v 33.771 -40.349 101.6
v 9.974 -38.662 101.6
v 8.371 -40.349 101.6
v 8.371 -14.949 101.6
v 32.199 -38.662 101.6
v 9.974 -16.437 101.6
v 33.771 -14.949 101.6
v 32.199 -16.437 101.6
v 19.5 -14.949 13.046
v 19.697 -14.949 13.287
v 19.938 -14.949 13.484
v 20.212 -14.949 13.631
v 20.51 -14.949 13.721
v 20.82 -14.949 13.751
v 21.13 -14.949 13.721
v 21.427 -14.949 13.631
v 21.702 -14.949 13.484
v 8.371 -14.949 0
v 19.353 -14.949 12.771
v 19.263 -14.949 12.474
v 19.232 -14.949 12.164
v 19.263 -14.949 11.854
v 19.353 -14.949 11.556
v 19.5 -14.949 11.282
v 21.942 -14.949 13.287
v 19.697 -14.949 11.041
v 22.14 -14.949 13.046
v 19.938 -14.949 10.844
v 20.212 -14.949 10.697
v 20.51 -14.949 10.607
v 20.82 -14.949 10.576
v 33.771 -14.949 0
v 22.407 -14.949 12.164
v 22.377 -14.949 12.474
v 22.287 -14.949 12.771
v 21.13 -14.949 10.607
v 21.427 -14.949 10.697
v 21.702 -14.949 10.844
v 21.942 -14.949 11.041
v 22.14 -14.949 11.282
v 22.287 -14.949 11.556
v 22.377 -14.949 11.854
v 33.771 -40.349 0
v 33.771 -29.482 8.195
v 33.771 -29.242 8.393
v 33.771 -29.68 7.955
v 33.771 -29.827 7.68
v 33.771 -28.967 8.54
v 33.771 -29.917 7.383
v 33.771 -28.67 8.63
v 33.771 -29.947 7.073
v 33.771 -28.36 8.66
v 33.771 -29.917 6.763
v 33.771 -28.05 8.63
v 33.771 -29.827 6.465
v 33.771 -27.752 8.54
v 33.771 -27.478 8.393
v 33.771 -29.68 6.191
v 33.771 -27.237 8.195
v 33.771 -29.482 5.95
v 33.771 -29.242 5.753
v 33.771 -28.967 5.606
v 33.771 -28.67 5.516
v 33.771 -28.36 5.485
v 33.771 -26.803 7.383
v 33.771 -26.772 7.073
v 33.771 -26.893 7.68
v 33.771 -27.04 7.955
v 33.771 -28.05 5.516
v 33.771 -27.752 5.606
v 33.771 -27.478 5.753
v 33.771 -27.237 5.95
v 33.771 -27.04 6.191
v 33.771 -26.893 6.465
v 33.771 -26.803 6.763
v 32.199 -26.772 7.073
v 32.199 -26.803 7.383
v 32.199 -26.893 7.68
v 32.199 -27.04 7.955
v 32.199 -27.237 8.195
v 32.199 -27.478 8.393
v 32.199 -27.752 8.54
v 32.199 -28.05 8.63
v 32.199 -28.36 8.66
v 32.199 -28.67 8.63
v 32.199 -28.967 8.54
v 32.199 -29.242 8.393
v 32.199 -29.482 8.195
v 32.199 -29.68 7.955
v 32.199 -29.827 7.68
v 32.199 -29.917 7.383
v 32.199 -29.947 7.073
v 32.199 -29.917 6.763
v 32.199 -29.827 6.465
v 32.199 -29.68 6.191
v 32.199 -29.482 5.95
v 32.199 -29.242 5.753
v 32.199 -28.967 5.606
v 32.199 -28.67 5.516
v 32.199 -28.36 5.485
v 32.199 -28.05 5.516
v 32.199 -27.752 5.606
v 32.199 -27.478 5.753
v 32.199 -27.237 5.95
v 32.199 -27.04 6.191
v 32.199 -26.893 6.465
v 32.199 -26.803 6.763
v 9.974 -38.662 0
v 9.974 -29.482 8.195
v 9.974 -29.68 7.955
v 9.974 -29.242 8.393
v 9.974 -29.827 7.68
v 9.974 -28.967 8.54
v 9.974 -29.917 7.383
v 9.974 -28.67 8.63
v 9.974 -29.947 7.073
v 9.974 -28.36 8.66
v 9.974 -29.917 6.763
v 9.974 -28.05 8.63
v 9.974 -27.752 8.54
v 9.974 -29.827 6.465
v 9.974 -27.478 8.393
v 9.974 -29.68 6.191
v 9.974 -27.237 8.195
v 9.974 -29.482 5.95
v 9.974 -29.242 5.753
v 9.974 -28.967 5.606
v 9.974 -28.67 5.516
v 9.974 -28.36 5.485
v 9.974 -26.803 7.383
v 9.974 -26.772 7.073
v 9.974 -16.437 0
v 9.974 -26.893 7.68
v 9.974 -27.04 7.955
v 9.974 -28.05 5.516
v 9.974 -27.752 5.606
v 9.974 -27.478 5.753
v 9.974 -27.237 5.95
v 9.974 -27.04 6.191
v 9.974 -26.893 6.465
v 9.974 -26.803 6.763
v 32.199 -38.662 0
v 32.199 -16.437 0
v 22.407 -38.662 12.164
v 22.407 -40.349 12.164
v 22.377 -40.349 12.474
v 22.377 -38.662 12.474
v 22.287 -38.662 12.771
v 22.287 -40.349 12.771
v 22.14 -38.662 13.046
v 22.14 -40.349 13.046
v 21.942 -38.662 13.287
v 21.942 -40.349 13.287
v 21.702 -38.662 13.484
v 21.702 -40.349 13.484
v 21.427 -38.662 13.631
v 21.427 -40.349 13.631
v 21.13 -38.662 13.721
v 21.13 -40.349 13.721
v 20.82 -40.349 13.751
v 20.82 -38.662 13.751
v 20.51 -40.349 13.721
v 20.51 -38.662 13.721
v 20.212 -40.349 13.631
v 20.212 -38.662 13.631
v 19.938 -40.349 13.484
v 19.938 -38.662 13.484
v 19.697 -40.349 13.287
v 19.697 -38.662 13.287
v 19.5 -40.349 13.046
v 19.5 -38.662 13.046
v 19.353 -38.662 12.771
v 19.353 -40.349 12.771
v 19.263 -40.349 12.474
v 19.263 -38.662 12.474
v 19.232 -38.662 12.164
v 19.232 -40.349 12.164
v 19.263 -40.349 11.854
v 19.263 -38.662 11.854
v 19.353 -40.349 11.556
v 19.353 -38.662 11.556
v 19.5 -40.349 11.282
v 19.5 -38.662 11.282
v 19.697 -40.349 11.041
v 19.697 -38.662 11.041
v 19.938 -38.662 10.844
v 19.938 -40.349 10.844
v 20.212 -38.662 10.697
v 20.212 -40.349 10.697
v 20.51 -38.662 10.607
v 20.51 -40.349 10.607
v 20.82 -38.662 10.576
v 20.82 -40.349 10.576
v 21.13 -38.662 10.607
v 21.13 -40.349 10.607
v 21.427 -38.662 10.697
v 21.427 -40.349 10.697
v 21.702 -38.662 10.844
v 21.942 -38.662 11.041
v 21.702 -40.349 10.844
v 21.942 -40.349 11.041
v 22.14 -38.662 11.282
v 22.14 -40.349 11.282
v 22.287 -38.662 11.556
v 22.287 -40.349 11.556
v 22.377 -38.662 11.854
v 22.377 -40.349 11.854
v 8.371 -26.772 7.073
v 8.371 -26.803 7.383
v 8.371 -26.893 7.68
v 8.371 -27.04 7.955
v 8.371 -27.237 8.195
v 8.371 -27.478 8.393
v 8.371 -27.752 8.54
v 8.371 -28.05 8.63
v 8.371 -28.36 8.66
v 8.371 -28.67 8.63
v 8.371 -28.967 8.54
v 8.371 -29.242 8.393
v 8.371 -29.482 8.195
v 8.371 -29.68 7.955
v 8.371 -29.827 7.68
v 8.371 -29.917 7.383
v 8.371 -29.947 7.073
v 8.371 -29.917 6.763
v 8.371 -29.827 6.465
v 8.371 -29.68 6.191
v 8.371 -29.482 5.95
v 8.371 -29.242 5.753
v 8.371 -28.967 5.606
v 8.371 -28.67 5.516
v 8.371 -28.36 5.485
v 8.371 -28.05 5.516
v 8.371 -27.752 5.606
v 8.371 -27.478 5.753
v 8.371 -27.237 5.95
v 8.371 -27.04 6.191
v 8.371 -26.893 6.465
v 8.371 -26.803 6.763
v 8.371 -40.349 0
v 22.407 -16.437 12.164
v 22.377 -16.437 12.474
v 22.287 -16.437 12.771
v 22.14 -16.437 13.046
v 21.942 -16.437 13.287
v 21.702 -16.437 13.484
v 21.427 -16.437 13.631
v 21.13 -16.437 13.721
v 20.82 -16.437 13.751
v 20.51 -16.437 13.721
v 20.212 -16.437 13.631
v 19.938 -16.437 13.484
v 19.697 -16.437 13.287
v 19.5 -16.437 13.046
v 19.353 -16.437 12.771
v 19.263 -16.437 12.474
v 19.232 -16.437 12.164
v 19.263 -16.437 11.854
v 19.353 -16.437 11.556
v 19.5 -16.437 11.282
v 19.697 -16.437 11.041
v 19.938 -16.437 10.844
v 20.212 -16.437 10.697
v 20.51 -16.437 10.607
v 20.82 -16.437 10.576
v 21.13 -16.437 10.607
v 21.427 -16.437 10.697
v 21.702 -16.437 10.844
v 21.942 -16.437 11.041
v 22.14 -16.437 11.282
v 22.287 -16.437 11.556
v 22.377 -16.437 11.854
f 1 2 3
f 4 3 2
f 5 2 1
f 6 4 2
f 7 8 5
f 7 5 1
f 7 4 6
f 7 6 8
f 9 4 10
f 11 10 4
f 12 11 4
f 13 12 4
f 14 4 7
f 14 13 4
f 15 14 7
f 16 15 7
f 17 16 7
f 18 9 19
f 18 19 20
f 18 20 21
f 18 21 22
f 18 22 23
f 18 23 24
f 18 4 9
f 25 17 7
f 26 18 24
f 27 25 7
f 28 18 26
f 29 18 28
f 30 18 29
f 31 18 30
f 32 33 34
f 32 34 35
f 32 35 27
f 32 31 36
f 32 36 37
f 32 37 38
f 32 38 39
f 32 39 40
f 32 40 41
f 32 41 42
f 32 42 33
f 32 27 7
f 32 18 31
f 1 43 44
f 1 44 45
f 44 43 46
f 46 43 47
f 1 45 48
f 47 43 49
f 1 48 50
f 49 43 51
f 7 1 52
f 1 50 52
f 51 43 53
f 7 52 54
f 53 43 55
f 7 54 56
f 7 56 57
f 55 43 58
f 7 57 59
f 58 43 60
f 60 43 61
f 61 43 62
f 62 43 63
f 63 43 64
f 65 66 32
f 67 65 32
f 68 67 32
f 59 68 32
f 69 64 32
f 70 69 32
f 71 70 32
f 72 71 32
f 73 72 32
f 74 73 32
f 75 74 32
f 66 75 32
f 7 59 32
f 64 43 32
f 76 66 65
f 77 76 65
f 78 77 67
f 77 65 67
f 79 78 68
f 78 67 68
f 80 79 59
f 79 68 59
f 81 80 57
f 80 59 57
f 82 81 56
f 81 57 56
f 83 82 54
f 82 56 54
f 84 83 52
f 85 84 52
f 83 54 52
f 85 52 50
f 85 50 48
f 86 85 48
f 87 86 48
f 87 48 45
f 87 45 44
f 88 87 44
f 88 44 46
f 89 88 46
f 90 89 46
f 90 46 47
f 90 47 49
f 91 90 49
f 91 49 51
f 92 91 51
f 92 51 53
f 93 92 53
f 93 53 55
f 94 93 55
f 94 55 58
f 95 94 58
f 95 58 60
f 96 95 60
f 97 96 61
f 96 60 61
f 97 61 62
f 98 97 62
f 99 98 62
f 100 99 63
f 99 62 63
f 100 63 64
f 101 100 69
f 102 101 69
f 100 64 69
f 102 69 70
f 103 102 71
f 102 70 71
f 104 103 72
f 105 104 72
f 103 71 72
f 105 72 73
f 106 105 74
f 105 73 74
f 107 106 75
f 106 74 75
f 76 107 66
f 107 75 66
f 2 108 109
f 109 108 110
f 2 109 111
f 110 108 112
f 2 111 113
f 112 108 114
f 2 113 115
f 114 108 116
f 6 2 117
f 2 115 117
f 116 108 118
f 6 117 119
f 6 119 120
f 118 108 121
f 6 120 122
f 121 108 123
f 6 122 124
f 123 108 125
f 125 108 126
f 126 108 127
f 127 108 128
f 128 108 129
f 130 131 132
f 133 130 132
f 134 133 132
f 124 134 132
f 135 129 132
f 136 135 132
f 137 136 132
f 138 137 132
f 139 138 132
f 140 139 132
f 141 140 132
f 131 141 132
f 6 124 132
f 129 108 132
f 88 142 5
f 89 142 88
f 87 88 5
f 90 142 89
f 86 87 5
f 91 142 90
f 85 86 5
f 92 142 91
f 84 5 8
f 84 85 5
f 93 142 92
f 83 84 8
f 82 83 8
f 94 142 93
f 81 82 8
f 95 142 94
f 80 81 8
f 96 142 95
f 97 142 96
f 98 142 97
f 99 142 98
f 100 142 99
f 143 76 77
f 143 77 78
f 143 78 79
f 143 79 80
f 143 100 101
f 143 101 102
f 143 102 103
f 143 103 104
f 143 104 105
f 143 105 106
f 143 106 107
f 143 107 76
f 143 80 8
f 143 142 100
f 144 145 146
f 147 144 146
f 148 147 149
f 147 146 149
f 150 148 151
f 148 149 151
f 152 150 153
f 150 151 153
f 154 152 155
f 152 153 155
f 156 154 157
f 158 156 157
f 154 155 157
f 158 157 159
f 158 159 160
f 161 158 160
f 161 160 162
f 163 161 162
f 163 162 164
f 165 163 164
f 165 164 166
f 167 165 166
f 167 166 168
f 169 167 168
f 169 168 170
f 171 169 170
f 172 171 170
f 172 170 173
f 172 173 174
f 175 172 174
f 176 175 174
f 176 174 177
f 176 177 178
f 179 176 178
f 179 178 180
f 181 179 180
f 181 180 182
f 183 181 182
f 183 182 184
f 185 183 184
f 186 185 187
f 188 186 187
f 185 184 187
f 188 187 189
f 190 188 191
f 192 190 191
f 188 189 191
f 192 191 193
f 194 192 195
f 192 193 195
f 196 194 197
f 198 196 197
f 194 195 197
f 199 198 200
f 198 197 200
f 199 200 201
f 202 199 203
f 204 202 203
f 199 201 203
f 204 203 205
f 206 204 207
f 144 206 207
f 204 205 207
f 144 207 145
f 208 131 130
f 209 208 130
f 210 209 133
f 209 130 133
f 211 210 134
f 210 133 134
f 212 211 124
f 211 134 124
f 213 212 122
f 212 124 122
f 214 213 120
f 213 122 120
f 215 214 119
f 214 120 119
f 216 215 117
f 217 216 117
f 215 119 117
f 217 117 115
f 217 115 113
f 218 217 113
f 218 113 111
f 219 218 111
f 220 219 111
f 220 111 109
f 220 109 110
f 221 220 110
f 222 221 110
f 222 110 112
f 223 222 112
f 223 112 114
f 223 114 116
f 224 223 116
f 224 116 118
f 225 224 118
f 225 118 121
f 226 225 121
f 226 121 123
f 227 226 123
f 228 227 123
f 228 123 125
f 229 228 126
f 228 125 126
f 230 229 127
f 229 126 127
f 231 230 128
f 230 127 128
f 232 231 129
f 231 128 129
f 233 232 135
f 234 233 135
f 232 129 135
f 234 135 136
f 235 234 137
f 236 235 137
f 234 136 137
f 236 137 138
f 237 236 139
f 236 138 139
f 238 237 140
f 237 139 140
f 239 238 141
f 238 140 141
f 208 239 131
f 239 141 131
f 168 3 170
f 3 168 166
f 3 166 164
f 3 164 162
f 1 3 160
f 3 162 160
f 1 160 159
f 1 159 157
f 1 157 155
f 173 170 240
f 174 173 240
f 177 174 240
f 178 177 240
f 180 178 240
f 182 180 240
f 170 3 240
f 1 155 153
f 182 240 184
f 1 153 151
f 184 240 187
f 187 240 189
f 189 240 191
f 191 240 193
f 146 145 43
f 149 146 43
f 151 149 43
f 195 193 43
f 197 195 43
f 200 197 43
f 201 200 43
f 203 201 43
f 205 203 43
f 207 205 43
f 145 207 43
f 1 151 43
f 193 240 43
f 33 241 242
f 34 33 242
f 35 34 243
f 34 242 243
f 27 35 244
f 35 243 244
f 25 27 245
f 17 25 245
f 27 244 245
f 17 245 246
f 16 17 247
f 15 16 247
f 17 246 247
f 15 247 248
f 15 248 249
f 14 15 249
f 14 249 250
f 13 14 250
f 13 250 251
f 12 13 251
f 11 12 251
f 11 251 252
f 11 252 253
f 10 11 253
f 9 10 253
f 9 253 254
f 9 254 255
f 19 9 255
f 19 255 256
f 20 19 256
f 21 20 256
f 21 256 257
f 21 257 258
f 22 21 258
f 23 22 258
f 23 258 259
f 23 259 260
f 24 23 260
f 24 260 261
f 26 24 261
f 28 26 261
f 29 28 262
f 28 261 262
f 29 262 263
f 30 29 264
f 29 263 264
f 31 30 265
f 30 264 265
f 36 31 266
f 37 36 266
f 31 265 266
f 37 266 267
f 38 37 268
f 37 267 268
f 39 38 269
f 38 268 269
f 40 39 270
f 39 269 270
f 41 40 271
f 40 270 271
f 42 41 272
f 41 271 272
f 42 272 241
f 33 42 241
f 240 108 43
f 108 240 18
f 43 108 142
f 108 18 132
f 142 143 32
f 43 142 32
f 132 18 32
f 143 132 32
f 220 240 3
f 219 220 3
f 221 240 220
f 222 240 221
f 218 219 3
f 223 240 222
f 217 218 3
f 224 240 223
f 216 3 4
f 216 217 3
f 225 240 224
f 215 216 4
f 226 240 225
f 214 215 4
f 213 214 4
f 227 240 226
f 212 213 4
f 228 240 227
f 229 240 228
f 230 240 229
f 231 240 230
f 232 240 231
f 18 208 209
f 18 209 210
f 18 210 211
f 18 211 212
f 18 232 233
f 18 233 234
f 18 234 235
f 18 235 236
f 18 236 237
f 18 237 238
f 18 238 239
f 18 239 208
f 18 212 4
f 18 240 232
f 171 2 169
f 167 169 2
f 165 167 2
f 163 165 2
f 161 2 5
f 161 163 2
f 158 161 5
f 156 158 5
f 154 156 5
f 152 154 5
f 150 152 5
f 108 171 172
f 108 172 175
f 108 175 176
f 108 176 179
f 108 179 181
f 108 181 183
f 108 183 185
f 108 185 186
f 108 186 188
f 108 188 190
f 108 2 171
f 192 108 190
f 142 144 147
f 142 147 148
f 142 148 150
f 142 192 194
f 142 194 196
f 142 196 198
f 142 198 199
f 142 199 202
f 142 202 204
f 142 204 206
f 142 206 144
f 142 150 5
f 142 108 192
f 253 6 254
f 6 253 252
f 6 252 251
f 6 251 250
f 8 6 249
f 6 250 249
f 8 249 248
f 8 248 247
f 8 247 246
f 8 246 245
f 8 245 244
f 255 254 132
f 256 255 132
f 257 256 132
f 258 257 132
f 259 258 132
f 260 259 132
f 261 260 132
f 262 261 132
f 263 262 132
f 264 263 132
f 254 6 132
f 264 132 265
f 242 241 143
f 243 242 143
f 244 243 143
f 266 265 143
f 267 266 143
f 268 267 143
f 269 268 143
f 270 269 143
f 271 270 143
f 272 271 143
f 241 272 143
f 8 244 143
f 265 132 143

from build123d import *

# Parameters (mm, degrees)
F1_W     = 25.4
F1_H     = 25.4
F1_W_2   = 22.225
F1_H_2   = 22.225
F2_DEPTH = 101.6
F4_D     = 3.175
F6_D     = 3.175


with BuildPart() as f2:
    # F1 (on face) → F2 (new body)
    with BuildSketch(Plane.XY):
        with Locations((21.07109, -27.648601)):
            Rectangle(F1_W, F1_H)
        with Locations((21.086402, -27.549498)):
            Rectangle(F1_W_2, F1_H_2, mode=Mode.SUBTRACT)
    extrude(amount=F2_DEPTH)

    # F4 (through all)
    with Locations(Plane(origin=(0, -14.948601, 0), x_dir=(-1, 0, 0), z_dir=(0, 1, 0))):
        with Locations((-20.819843, 12.163988)):
            Hole(F4_D / 2)

    # F6 (through all)
    with Locations(Plane(origin=(8.37109, 0, 0), x_dir=(0, -1, 0), z_dir=(-1, 0, 0))):
        with Locations((28.359888, 7.072924)):
            Hole(F6_D / 2)


solid = f2.part
